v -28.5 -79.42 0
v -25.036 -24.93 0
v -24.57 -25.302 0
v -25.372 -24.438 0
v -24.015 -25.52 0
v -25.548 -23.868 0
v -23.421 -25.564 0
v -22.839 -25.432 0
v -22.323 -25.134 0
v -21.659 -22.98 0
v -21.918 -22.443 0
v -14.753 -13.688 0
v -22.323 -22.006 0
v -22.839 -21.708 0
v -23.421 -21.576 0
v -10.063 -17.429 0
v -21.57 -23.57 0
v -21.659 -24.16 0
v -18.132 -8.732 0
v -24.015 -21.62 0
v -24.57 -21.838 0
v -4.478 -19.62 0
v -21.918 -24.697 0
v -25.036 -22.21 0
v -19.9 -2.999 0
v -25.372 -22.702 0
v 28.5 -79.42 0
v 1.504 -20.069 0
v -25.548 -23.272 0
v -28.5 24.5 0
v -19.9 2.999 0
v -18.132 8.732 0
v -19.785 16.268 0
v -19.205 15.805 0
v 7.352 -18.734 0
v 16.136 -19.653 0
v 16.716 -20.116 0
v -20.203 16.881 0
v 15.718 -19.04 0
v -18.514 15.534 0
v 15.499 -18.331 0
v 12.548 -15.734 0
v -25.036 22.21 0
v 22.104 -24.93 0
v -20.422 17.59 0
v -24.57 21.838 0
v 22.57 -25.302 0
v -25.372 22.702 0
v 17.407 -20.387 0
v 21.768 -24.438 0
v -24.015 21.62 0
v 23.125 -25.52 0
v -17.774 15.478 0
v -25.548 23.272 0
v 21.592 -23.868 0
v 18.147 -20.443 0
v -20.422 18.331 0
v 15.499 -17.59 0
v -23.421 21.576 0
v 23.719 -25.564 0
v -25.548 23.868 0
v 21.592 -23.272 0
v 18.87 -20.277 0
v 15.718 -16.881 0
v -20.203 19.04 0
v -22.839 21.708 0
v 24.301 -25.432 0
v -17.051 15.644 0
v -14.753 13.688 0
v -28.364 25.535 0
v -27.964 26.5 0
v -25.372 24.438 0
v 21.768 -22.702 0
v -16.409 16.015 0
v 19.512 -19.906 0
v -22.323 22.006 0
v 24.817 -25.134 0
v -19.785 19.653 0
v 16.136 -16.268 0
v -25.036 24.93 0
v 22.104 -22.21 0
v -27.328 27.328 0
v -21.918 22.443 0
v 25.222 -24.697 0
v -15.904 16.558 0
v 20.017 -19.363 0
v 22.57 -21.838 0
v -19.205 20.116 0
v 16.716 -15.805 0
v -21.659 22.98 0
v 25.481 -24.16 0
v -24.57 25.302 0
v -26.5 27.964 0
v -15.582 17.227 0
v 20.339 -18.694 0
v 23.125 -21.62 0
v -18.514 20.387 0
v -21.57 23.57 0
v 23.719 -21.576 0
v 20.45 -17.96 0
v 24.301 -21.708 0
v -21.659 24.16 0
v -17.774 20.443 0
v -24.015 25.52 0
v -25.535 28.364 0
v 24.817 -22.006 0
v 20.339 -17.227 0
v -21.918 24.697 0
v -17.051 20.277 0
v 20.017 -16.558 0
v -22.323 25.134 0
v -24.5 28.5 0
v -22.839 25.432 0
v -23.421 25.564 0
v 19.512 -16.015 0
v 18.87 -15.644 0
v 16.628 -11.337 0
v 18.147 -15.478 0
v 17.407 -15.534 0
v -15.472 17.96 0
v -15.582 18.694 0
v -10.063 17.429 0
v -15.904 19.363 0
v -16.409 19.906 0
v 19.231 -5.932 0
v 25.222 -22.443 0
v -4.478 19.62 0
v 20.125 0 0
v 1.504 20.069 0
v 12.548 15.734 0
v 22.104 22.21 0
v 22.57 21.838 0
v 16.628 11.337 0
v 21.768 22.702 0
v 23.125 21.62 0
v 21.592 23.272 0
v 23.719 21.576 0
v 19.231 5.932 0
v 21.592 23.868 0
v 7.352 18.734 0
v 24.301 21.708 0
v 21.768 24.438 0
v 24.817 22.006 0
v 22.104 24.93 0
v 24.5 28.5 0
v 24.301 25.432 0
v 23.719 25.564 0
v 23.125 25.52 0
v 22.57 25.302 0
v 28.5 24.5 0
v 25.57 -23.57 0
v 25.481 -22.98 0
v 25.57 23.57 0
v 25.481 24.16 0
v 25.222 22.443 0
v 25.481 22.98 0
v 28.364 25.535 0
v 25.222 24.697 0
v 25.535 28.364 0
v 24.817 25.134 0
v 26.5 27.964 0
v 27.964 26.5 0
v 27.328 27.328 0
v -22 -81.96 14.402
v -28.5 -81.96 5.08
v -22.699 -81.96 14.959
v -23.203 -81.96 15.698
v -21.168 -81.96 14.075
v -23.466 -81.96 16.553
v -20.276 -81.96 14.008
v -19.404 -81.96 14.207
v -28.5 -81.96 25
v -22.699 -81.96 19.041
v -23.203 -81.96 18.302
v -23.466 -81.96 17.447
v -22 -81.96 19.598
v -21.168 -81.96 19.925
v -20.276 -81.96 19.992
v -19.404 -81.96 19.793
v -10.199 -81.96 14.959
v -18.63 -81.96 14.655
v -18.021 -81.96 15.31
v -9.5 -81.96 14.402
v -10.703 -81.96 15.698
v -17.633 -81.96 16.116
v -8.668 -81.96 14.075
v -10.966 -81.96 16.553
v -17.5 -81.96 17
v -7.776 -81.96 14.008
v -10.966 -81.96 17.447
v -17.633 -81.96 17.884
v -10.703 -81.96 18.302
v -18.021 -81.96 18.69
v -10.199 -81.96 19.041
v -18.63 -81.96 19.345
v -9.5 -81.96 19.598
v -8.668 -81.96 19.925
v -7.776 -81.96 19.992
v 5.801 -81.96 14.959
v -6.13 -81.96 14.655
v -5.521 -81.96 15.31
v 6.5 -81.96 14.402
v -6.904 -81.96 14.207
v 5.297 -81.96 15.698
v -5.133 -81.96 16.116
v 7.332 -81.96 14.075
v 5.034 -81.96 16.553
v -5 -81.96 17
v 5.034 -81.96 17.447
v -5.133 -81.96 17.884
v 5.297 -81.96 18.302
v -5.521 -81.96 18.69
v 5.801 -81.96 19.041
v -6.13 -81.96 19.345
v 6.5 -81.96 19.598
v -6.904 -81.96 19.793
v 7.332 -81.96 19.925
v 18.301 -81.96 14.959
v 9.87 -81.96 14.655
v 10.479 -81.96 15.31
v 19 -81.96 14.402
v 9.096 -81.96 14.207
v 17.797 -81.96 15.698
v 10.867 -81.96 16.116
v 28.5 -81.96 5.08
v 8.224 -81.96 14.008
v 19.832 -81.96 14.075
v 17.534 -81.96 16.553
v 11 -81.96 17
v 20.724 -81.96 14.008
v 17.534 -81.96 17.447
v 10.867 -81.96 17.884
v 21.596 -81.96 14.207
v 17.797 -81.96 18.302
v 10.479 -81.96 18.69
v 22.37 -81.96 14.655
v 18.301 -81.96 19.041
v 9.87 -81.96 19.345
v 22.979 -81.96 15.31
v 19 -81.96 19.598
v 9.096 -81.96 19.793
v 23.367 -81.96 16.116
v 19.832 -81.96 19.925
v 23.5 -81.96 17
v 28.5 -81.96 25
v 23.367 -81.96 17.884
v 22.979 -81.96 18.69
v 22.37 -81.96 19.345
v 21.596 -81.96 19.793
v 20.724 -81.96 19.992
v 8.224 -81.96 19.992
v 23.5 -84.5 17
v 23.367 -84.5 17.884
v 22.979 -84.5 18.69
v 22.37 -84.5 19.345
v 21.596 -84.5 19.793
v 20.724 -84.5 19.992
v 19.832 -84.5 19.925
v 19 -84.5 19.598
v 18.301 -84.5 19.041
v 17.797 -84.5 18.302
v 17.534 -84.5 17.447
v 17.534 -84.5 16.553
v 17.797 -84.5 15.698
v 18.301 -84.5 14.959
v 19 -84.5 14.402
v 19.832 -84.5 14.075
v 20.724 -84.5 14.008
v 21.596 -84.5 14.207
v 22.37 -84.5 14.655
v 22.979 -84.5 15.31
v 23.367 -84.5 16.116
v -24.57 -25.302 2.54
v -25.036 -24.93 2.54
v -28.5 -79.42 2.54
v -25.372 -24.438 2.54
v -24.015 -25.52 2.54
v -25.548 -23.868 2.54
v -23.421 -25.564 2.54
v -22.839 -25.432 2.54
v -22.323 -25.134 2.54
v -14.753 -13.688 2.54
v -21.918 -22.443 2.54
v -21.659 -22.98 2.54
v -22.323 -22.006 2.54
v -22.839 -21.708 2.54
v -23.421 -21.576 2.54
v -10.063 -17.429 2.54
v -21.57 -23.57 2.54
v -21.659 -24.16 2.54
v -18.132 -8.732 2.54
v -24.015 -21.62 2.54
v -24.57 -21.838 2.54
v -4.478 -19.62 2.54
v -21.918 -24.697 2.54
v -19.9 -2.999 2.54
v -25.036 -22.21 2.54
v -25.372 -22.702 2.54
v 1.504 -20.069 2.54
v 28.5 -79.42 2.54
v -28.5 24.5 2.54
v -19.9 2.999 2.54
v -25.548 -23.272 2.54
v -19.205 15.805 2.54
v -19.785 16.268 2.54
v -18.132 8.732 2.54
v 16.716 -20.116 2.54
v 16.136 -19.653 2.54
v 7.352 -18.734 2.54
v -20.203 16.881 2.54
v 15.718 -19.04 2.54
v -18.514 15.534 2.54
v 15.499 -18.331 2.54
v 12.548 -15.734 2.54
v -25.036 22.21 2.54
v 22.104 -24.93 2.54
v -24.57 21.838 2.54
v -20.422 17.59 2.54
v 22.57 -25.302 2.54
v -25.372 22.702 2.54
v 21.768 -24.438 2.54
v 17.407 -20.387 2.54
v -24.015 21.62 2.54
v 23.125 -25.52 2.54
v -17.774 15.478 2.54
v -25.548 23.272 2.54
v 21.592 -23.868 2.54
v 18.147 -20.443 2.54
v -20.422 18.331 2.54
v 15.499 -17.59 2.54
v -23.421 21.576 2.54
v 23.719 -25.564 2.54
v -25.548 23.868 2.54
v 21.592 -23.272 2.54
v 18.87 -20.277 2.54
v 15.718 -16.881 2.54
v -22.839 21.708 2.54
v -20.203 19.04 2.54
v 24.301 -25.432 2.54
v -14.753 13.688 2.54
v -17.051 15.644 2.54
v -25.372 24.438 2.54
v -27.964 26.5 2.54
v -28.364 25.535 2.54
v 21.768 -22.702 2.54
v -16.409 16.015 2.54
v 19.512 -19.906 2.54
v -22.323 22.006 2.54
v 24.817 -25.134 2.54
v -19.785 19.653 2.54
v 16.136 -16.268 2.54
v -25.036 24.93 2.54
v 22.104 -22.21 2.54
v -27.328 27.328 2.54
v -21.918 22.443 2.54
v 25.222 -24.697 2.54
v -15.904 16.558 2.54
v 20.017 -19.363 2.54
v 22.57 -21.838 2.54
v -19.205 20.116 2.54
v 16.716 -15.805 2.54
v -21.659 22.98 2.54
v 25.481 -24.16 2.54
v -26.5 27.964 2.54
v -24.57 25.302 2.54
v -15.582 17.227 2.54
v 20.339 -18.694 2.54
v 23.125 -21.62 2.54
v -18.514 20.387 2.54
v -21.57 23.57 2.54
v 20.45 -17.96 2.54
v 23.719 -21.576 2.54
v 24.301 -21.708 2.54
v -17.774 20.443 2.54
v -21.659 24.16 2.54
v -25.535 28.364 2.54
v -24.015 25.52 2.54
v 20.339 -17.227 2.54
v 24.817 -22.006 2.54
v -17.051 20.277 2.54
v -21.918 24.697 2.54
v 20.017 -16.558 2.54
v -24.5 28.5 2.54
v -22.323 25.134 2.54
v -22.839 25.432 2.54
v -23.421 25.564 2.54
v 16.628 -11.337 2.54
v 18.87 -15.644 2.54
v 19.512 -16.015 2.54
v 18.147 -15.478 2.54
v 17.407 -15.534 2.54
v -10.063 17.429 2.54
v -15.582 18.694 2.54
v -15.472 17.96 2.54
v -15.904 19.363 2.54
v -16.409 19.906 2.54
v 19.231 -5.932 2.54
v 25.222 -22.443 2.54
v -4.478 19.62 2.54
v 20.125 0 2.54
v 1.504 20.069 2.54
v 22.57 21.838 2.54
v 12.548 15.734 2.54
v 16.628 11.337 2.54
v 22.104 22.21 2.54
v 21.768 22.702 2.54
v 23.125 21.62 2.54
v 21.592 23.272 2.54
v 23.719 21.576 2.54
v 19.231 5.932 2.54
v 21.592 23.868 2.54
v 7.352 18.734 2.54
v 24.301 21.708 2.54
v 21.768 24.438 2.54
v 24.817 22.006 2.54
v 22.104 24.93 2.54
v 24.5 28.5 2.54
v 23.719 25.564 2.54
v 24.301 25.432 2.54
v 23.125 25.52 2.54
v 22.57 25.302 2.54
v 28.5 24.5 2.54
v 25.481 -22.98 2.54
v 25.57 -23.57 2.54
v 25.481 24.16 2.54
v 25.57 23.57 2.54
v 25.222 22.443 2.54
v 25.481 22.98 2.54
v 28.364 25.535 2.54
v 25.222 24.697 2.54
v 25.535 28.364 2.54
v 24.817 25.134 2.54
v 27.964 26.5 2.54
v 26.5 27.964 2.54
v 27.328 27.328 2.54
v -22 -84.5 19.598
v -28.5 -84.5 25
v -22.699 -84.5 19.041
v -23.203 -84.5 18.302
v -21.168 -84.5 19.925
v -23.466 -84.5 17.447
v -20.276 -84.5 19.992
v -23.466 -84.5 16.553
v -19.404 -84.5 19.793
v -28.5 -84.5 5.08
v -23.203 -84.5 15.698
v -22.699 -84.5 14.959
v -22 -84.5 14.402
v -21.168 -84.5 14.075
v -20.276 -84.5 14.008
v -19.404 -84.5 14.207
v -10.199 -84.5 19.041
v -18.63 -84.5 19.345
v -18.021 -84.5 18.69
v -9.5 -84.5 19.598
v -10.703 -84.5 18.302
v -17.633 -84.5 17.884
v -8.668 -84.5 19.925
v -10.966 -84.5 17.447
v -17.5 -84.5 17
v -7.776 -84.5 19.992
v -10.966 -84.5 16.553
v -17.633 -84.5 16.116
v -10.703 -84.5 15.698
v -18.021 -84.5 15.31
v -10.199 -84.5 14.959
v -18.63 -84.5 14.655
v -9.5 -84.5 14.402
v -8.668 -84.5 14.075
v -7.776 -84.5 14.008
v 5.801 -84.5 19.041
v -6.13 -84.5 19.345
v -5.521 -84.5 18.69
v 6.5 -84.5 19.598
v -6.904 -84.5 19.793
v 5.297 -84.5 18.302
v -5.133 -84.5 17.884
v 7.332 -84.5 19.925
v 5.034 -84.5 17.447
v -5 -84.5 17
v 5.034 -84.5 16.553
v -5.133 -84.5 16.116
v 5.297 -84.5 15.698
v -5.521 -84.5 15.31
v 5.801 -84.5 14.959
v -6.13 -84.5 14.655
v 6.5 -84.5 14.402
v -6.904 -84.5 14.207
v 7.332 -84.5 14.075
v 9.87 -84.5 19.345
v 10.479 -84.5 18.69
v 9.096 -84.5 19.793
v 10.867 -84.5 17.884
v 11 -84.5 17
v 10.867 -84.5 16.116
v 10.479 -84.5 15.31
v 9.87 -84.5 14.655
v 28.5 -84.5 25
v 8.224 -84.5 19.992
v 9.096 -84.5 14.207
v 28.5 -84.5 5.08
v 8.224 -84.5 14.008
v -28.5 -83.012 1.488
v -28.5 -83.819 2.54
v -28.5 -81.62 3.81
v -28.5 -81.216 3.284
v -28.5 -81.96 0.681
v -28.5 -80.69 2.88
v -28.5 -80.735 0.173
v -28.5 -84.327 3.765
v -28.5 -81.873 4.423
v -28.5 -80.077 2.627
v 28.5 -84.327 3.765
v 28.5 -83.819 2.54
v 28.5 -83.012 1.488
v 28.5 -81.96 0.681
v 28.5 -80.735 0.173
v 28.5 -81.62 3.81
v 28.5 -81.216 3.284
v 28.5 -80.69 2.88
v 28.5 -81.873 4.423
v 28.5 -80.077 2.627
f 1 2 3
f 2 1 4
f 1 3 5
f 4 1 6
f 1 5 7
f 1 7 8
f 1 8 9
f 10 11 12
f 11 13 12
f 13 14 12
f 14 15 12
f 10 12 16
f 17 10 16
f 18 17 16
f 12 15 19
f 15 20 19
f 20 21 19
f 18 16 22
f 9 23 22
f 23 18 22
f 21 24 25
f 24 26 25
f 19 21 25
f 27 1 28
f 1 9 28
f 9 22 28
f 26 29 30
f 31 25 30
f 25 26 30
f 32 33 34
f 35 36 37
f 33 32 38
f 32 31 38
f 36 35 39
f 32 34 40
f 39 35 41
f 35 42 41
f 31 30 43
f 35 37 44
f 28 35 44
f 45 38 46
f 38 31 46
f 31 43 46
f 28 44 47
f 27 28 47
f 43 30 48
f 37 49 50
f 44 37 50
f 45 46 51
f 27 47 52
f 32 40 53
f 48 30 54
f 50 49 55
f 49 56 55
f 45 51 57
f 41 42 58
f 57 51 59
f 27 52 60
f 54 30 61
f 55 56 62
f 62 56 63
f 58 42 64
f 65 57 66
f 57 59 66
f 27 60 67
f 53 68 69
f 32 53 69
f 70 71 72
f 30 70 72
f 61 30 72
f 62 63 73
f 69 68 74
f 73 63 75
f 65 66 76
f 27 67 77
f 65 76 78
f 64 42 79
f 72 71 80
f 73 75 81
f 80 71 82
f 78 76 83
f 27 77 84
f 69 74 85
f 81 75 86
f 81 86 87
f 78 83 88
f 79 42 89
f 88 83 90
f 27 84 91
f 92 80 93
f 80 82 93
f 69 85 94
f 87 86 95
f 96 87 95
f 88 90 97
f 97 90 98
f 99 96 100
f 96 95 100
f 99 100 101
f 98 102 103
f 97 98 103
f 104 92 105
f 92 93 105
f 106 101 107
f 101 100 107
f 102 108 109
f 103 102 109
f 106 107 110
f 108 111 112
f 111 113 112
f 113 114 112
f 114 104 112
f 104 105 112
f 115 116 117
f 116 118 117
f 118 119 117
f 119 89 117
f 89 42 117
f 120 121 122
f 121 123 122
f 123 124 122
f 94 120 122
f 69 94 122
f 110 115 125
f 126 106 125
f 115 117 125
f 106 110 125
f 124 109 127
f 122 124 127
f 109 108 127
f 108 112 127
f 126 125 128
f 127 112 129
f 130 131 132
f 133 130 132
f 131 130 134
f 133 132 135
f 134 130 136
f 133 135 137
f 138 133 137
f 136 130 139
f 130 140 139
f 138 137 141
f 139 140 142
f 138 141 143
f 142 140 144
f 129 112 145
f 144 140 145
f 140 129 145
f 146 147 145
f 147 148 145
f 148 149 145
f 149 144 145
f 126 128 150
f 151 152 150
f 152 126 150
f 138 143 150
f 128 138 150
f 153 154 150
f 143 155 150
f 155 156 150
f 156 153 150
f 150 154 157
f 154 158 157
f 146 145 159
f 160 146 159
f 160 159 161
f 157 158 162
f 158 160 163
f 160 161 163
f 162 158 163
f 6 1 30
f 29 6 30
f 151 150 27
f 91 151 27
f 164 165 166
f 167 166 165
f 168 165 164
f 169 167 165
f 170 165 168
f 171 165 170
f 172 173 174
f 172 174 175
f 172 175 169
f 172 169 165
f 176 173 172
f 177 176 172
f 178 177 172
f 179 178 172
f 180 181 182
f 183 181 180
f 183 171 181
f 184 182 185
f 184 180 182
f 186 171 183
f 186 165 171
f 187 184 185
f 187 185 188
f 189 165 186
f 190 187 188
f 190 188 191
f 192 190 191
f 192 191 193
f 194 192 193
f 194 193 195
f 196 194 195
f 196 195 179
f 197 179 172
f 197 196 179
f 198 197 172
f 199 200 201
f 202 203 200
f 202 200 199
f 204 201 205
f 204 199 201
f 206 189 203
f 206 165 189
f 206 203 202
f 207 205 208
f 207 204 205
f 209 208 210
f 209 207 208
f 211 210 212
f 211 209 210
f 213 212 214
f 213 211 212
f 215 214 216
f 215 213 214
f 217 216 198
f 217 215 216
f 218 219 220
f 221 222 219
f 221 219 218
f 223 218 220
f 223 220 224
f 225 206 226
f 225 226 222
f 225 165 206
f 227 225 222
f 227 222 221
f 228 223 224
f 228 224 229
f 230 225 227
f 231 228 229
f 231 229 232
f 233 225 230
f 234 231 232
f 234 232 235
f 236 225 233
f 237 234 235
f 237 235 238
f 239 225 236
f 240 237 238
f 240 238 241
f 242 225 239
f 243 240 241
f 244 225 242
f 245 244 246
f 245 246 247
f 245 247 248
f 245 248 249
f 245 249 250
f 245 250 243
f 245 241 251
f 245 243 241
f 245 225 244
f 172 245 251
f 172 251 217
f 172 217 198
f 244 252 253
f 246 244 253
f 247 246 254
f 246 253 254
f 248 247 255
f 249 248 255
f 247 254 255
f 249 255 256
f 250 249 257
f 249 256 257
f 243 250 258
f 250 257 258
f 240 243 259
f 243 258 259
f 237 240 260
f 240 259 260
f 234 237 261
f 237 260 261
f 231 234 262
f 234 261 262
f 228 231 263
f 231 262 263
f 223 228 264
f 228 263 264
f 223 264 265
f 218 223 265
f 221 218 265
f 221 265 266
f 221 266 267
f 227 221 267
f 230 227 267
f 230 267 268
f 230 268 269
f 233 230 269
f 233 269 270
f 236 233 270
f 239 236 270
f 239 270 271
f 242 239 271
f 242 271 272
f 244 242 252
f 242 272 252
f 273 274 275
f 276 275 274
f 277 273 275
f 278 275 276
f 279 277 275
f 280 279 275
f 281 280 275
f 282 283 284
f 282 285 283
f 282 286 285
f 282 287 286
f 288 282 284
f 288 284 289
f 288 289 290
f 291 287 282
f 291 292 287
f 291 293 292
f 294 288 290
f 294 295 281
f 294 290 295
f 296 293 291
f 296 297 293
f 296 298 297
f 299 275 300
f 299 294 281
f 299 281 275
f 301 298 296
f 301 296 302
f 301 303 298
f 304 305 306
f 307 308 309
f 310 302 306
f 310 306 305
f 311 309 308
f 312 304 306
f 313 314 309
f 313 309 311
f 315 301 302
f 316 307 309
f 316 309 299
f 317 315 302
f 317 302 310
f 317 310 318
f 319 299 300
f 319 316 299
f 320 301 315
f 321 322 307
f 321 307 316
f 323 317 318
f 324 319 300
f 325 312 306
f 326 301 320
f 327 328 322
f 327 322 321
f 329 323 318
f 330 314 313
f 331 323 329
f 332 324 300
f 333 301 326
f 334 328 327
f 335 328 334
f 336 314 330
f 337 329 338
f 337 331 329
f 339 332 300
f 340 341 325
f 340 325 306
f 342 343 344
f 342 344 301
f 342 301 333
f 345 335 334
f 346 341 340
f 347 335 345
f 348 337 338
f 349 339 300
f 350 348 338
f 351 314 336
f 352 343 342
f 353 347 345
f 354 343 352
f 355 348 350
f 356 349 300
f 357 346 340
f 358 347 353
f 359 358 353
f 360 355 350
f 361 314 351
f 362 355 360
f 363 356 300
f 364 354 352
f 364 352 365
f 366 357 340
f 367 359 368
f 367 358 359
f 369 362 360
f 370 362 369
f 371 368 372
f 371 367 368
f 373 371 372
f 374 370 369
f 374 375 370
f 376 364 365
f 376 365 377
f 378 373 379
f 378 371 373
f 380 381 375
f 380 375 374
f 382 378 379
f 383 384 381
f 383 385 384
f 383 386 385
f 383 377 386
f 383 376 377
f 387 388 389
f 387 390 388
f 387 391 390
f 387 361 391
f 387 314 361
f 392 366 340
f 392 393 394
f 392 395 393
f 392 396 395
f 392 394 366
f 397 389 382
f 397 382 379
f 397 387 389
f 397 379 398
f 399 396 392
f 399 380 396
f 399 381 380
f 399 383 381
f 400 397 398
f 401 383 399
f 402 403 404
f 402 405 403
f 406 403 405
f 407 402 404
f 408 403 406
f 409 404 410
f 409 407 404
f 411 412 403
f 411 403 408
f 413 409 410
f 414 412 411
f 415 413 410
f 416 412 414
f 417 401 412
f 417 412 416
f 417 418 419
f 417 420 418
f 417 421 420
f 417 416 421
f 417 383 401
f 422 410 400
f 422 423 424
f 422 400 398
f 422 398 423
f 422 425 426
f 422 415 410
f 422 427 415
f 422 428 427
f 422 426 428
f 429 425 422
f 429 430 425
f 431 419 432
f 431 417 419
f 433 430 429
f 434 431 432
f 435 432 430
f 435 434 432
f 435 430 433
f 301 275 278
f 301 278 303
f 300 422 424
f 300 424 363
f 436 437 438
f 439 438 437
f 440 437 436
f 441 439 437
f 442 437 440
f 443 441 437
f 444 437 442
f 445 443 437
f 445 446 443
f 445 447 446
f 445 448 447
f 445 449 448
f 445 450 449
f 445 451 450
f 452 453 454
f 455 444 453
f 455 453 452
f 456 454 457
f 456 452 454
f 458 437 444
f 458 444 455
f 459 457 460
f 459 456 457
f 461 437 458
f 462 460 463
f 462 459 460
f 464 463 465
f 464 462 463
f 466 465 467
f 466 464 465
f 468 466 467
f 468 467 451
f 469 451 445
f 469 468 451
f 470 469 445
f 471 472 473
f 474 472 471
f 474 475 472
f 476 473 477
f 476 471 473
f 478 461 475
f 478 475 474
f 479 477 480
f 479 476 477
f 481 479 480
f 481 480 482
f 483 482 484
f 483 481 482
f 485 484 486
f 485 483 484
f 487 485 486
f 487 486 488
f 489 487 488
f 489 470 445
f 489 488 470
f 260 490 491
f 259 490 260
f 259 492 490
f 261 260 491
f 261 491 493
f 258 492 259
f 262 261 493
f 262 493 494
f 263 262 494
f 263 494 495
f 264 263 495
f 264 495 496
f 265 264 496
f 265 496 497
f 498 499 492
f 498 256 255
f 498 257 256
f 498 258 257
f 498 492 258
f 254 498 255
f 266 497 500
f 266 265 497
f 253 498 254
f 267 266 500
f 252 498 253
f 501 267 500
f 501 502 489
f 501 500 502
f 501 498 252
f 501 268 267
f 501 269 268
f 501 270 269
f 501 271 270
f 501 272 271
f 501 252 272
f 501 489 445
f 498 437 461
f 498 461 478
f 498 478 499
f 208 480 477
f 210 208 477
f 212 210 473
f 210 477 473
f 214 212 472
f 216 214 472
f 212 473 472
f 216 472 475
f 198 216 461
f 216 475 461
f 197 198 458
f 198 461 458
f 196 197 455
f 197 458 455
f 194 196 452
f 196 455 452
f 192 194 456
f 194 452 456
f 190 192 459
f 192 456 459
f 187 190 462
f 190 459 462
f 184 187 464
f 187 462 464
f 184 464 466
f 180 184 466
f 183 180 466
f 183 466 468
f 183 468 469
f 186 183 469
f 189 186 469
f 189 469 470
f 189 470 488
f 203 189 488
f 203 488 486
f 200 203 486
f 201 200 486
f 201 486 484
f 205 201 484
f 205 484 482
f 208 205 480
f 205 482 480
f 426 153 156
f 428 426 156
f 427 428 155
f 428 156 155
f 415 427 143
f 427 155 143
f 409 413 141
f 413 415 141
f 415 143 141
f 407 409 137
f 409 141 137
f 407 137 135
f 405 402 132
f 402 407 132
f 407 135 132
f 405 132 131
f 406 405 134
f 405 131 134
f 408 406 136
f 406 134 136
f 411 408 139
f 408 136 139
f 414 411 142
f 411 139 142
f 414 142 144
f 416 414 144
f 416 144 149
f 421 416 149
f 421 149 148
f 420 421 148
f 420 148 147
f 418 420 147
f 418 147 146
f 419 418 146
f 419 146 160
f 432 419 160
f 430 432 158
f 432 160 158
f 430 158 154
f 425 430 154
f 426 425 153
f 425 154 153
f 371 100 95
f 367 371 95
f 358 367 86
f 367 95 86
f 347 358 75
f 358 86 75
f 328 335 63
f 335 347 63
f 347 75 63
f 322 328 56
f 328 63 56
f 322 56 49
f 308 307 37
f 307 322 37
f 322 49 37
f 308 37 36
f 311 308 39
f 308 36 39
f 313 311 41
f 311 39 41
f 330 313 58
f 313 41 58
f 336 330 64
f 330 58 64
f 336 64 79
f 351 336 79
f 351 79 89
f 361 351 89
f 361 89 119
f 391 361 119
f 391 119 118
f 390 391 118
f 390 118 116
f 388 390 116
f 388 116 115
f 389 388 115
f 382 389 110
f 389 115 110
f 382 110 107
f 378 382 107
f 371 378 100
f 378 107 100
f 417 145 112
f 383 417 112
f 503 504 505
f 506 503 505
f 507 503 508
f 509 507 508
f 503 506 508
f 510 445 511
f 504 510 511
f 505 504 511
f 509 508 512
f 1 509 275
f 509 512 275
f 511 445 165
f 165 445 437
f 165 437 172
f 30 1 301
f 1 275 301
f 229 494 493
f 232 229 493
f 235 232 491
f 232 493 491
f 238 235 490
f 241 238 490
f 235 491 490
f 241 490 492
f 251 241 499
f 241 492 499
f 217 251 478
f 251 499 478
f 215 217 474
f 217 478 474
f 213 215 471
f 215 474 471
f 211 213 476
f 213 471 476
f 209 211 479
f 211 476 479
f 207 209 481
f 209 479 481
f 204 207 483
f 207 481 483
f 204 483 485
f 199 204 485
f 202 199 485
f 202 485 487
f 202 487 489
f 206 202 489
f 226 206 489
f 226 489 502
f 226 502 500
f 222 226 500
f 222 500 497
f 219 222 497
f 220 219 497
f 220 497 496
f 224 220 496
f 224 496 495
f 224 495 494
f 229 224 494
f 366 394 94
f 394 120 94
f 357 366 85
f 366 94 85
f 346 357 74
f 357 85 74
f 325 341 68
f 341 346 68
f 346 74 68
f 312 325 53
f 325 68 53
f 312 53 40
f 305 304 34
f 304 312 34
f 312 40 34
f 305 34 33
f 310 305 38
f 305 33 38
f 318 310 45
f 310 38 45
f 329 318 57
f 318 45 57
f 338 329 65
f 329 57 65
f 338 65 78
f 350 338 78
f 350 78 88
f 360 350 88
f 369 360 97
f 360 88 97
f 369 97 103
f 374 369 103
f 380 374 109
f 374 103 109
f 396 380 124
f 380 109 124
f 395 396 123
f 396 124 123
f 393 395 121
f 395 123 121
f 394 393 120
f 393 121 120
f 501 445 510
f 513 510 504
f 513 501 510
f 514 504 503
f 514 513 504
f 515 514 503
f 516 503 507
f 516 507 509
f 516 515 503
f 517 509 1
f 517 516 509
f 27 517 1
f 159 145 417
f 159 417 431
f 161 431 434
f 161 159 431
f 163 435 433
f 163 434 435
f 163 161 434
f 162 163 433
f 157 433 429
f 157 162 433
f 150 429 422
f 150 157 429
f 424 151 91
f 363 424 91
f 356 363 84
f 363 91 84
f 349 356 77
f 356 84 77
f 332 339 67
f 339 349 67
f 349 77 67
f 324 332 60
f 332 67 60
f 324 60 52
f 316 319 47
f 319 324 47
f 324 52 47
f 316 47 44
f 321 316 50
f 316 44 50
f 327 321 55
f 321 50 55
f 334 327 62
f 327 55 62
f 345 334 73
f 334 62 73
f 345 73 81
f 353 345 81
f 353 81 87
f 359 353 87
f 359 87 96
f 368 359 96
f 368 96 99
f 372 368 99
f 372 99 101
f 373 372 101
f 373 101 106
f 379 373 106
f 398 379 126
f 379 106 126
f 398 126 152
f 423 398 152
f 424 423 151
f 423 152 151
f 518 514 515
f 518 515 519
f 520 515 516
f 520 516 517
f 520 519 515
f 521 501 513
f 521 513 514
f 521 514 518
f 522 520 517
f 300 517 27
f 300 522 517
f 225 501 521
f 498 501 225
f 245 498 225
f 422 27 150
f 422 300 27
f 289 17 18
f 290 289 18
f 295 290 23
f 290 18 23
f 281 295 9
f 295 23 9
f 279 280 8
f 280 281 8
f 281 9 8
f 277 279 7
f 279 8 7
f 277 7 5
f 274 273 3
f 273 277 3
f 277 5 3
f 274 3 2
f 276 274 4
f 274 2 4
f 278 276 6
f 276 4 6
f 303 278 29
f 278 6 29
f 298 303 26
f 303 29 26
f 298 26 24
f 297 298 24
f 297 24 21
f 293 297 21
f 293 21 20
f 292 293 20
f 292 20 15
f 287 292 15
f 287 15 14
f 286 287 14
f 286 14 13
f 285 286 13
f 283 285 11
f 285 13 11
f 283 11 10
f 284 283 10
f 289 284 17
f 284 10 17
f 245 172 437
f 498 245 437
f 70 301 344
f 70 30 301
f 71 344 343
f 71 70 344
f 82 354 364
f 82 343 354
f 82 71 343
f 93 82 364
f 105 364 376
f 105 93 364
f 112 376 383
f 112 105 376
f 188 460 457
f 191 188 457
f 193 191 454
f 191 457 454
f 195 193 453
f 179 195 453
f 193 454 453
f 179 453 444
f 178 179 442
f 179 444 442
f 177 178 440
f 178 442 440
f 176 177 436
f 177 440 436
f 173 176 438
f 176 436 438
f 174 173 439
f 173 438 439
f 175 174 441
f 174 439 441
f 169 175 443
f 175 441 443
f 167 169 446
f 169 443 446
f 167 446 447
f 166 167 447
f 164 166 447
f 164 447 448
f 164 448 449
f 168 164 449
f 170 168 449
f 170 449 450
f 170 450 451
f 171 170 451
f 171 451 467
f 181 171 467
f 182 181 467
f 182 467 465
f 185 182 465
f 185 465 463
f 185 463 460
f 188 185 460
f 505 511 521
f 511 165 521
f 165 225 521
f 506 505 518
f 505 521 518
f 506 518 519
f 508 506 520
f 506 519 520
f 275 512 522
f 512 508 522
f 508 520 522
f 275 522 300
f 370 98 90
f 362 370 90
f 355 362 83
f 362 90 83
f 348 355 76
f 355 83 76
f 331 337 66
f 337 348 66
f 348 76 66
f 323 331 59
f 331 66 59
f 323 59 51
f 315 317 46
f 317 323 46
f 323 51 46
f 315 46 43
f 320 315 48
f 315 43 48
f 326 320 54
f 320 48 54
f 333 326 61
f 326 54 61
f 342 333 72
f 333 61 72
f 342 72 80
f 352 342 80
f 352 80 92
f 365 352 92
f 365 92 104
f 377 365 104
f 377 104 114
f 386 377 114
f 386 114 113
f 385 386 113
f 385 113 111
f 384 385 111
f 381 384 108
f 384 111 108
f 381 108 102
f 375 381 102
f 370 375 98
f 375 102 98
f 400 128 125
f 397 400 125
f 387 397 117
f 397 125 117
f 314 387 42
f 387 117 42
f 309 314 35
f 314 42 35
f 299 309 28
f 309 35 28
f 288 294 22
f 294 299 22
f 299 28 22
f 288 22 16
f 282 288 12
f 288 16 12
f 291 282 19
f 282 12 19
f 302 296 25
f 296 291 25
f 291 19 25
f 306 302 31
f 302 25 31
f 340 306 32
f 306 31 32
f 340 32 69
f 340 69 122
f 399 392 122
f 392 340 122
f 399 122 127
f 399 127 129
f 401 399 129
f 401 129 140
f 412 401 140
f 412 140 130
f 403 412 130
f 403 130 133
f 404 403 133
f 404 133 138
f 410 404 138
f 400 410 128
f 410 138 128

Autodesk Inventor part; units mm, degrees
ref_plane "YZ Plane" through (0, 0, 0) normal (1, 0, 0) x (0, 1, 0)
ref_plane "XZ Plane" through (0, 0, 0) normal (0, 1, 0) x (-1, 0, 0)
ref_plane "XY Plane" through (0, 0, 0) normal (0, 0, 1) x (1, 0, 0)
sketch "Base" plane through (0, 0, 0) normal (0, 0, 1) x (1, 0, 0)
  circle A0 centre (0, 0) radius 19.125 construction
  arc A1 (28.5, 24.5) -> (24.5, 28.5) centre (24.5, 24.5) ccw
  line L0 (24.5, 28.5) -> (-24.5, 28.5)
  arc A2 (-24.5, 28.5) -> (-28.5, 24.5) centre (-24.5, 24.5) ccw
  line L1 (-28.5, 24.5) -> (-28.5, -24.5)
  arc A3 (-28.5, -24.5) -> (-24.5, -28.5) centre (-24.5, -24.5) ccw
  line L2 (-24.5, -28.5) -> (24.5, -28.5)
  arc A4 (24.5, -28.5) -> (28.5, -24.5) centre (24.5, -24.5) ccw
  line L3 (28.5, -24.5) -> (28.5, 24.5)
  circle A5 centre (-23.57, 23.57) radius 2
  circle A6 centre (23.57, 23.57) radius 2
  circle A7 centre (-23.57, -23.57) radius 2
  circle A8 centre (23.57, -23.57) radius 2
  circle A9 centre (0, 0) radius 20.125
  circle A10 centre (-17.9605, 17.9605) radius 2.489
  circle A11 centre (17.9605, -17.9605) radius 2.489
  point P0 (0, 0)
  dimension "d0" = 1
extrude "Plate1" add sketch "Base" along normal blind 2.54
sketch "Sketch2" plane through (0, 0, 2.54) normal (0, 0, 1) x (1, 0, 0)
  line L0 (28.5, -24.5) -> (28.5, 24.5)
  line L1 (28.5, -24.5) -> (28.5, -84.5)
  line L2 (-28.5, 24.5) -> (-28.5, -24.5)
  line L3 (-28.5, -24.5) -> (-28.5, -84.5)
  line L4 (28.5, -84.5) -> (-28.5, -84.5)
  arc A0 (24.5, -28.5) -> (28.5, -24.5) centre (24.5, -24.5) ccw
  line L5 (24.5, -28.5) -> (-24.5, -28.5)
  arc A1 (-28.5, -24.5) -> (-24.5, -28.5) centre (-24.5, -24.5) ccw
  point P0 (0, 0)
  dimension "d2" = 60
sheet face with bend "Face2" sketch "Sketch2" thickness 2.54 toward (0, 0, -1) bend radius 2.54
bend "Bend1"
sketch "Sketch3" plane through (28.5, -81.96, 0) normal (0, -1, 0) x (1, 0, 0)
  line L0 (-57, 0) -> (0, 0)
  line L1 (0, 0) -> (0, 25)
  line L2 (0, 25) -> (-57, 25)
  line L3 (-57, 25) -> (-57, 0)
edge flange "Flange1" height 25 angle 90 thickness 2.54 bend radius 2.54 thickness toward (0, -1, 0) relief tear relief width 2.54 relief depth 1.27 edges at (0, -84.5, 2.54) wall of the first edge with corners at (-28.5, -81.96, 0) (28.5, -81.96, 0) (28.5, -81.96, 25) (-28.5, -81.96, 25)
bend "Bend2"
corner "Corner1"
sketch "Sketch4" plane through (-28.5, -84.5, 25) normal (0, -1, 0) x (1, 0, 0)
  line L0 (0, 0) -> (57, 0) construction
  line L1 (28.5, 0) -> (28.5, -19.92) construction
  line L2 (57, -19.92) -> (0, -19.92) construction
  circle A0 centre (8, -8) radius 3
  circle A1 centre (49, -8) radius 3
  line L3 (0, -19.92) -> (0, 0) projected
  circle A2 centre (20.5, -8) radius 3
  circle A3 centre (36.5, -8) radius 3
  point P0 (28.5, -25)
  dimension "d18" = 6
  dimension "d19" = 8
  dimension "d20" = 8
  dimension "d21" = 8
  dimension "d22" = 8
  dimension "d25" = 12.5
extrude "Cut1" cut sketch "Sketch4" against normal blind 2.54
equation "\"d22\" = d19"
equation "\"d23\" = Thickness"
equation "\"d1\" = Thickness"
equation "\"d3\" = BendRadius"
equation "\"d4\" = BendReliefWidth"
equation "\"d6\" = MinimumRemnant"
equation "\"d5\" = BendReliefDepth"
equation "\"d7\" = TransitionRadius"
equation "\"d8\" = BendReliefWidth"
equation "\"d9\" = BendReliefDepth"
equation "\"d10\" = MinimumRemnant"
equation "\"d11\" = TransitionRadius"
equation "\"d14\" = BendRadius"
equation "\"d15\" = CornerReliefSize"
equation "\"d16\" = GapSize"
equation "\"d17\" = JacobiRadiusSize"
equation "\"BendRadius\" = Thickness"
equation "\"BendReliefWidth\" = Thickness"
equation "\"BendReliefDepth\" = 0.5 * Thickness"
equation "\"CornerReliefSize\" = 4 * Thickness"
equation "\"MinimumRemnant\" = 2 * Thickness"
equation "\"TransitionRadius\" = BendRadius"
equation "\"JacobiRadiusSize\" = BendRadius"
equation "\"GapSize\" = Thickness"
equation "\"Thickness\" = 2.54"
properties part number "NeckStepperCover"
